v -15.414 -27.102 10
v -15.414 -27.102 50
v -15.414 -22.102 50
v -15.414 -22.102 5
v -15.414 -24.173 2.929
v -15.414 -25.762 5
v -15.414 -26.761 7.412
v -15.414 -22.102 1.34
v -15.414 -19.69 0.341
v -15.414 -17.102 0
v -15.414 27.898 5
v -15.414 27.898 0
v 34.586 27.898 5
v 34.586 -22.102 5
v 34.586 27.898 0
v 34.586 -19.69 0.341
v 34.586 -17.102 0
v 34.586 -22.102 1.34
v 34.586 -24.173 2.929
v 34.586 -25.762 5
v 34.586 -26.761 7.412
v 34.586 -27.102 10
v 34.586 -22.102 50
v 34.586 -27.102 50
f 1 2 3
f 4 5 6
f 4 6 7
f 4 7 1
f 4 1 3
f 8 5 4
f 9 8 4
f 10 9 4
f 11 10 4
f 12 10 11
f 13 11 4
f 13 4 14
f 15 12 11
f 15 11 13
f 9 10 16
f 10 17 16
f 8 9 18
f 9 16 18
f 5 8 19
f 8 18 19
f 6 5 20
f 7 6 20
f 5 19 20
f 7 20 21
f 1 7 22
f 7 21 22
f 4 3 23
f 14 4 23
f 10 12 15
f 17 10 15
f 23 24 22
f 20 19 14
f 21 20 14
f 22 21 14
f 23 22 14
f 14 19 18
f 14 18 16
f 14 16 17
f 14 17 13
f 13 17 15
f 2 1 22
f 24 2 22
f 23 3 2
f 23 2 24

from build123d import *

# Parameters (mm, degrees)
SKETCH1_W           = 50
SKETCH1_H           = 55
BOSS_EXTRUDE1_DEPTH = 50
SKETCH2_W           = 50
SKETCH2_H           = 50
CUT_EXTRUDE1_DEPTH  = 45
FILLET2_R           = 10


with BuildPart() as part:
    # Sketch1 → Boss-Extrude1 (new body)
    with BuildSketch(Plane.XY):
        with Locations((9.585987261, 0.398089172)):
            Rectangle(SKETCH1_W, SKETCH1_H)
    extrude(amount=BOSS_EXTRUDE1_DEPTH)

    # Sketch2 → Cut-Extrude1 (cut)
    with BuildSketch(Plane.XY.offset(50)):
        with Locations((9.585987261, 2.898089172)):
            Rectangle(SKETCH2_W, SKETCH2_H)
    extrude(amount=-CUT_EXTRUDE1_DEPTH, mode=Mode.SUBTRACT)

    # Fillet2
    fillet2_edges = [part.edges().sort_by_distance(p)[0] for p in [
        (9.585987261, -27.101910828, 0),
    ]]
    fillet(fillet2_edges, radius=FILLET2_R)


solid = part.part
